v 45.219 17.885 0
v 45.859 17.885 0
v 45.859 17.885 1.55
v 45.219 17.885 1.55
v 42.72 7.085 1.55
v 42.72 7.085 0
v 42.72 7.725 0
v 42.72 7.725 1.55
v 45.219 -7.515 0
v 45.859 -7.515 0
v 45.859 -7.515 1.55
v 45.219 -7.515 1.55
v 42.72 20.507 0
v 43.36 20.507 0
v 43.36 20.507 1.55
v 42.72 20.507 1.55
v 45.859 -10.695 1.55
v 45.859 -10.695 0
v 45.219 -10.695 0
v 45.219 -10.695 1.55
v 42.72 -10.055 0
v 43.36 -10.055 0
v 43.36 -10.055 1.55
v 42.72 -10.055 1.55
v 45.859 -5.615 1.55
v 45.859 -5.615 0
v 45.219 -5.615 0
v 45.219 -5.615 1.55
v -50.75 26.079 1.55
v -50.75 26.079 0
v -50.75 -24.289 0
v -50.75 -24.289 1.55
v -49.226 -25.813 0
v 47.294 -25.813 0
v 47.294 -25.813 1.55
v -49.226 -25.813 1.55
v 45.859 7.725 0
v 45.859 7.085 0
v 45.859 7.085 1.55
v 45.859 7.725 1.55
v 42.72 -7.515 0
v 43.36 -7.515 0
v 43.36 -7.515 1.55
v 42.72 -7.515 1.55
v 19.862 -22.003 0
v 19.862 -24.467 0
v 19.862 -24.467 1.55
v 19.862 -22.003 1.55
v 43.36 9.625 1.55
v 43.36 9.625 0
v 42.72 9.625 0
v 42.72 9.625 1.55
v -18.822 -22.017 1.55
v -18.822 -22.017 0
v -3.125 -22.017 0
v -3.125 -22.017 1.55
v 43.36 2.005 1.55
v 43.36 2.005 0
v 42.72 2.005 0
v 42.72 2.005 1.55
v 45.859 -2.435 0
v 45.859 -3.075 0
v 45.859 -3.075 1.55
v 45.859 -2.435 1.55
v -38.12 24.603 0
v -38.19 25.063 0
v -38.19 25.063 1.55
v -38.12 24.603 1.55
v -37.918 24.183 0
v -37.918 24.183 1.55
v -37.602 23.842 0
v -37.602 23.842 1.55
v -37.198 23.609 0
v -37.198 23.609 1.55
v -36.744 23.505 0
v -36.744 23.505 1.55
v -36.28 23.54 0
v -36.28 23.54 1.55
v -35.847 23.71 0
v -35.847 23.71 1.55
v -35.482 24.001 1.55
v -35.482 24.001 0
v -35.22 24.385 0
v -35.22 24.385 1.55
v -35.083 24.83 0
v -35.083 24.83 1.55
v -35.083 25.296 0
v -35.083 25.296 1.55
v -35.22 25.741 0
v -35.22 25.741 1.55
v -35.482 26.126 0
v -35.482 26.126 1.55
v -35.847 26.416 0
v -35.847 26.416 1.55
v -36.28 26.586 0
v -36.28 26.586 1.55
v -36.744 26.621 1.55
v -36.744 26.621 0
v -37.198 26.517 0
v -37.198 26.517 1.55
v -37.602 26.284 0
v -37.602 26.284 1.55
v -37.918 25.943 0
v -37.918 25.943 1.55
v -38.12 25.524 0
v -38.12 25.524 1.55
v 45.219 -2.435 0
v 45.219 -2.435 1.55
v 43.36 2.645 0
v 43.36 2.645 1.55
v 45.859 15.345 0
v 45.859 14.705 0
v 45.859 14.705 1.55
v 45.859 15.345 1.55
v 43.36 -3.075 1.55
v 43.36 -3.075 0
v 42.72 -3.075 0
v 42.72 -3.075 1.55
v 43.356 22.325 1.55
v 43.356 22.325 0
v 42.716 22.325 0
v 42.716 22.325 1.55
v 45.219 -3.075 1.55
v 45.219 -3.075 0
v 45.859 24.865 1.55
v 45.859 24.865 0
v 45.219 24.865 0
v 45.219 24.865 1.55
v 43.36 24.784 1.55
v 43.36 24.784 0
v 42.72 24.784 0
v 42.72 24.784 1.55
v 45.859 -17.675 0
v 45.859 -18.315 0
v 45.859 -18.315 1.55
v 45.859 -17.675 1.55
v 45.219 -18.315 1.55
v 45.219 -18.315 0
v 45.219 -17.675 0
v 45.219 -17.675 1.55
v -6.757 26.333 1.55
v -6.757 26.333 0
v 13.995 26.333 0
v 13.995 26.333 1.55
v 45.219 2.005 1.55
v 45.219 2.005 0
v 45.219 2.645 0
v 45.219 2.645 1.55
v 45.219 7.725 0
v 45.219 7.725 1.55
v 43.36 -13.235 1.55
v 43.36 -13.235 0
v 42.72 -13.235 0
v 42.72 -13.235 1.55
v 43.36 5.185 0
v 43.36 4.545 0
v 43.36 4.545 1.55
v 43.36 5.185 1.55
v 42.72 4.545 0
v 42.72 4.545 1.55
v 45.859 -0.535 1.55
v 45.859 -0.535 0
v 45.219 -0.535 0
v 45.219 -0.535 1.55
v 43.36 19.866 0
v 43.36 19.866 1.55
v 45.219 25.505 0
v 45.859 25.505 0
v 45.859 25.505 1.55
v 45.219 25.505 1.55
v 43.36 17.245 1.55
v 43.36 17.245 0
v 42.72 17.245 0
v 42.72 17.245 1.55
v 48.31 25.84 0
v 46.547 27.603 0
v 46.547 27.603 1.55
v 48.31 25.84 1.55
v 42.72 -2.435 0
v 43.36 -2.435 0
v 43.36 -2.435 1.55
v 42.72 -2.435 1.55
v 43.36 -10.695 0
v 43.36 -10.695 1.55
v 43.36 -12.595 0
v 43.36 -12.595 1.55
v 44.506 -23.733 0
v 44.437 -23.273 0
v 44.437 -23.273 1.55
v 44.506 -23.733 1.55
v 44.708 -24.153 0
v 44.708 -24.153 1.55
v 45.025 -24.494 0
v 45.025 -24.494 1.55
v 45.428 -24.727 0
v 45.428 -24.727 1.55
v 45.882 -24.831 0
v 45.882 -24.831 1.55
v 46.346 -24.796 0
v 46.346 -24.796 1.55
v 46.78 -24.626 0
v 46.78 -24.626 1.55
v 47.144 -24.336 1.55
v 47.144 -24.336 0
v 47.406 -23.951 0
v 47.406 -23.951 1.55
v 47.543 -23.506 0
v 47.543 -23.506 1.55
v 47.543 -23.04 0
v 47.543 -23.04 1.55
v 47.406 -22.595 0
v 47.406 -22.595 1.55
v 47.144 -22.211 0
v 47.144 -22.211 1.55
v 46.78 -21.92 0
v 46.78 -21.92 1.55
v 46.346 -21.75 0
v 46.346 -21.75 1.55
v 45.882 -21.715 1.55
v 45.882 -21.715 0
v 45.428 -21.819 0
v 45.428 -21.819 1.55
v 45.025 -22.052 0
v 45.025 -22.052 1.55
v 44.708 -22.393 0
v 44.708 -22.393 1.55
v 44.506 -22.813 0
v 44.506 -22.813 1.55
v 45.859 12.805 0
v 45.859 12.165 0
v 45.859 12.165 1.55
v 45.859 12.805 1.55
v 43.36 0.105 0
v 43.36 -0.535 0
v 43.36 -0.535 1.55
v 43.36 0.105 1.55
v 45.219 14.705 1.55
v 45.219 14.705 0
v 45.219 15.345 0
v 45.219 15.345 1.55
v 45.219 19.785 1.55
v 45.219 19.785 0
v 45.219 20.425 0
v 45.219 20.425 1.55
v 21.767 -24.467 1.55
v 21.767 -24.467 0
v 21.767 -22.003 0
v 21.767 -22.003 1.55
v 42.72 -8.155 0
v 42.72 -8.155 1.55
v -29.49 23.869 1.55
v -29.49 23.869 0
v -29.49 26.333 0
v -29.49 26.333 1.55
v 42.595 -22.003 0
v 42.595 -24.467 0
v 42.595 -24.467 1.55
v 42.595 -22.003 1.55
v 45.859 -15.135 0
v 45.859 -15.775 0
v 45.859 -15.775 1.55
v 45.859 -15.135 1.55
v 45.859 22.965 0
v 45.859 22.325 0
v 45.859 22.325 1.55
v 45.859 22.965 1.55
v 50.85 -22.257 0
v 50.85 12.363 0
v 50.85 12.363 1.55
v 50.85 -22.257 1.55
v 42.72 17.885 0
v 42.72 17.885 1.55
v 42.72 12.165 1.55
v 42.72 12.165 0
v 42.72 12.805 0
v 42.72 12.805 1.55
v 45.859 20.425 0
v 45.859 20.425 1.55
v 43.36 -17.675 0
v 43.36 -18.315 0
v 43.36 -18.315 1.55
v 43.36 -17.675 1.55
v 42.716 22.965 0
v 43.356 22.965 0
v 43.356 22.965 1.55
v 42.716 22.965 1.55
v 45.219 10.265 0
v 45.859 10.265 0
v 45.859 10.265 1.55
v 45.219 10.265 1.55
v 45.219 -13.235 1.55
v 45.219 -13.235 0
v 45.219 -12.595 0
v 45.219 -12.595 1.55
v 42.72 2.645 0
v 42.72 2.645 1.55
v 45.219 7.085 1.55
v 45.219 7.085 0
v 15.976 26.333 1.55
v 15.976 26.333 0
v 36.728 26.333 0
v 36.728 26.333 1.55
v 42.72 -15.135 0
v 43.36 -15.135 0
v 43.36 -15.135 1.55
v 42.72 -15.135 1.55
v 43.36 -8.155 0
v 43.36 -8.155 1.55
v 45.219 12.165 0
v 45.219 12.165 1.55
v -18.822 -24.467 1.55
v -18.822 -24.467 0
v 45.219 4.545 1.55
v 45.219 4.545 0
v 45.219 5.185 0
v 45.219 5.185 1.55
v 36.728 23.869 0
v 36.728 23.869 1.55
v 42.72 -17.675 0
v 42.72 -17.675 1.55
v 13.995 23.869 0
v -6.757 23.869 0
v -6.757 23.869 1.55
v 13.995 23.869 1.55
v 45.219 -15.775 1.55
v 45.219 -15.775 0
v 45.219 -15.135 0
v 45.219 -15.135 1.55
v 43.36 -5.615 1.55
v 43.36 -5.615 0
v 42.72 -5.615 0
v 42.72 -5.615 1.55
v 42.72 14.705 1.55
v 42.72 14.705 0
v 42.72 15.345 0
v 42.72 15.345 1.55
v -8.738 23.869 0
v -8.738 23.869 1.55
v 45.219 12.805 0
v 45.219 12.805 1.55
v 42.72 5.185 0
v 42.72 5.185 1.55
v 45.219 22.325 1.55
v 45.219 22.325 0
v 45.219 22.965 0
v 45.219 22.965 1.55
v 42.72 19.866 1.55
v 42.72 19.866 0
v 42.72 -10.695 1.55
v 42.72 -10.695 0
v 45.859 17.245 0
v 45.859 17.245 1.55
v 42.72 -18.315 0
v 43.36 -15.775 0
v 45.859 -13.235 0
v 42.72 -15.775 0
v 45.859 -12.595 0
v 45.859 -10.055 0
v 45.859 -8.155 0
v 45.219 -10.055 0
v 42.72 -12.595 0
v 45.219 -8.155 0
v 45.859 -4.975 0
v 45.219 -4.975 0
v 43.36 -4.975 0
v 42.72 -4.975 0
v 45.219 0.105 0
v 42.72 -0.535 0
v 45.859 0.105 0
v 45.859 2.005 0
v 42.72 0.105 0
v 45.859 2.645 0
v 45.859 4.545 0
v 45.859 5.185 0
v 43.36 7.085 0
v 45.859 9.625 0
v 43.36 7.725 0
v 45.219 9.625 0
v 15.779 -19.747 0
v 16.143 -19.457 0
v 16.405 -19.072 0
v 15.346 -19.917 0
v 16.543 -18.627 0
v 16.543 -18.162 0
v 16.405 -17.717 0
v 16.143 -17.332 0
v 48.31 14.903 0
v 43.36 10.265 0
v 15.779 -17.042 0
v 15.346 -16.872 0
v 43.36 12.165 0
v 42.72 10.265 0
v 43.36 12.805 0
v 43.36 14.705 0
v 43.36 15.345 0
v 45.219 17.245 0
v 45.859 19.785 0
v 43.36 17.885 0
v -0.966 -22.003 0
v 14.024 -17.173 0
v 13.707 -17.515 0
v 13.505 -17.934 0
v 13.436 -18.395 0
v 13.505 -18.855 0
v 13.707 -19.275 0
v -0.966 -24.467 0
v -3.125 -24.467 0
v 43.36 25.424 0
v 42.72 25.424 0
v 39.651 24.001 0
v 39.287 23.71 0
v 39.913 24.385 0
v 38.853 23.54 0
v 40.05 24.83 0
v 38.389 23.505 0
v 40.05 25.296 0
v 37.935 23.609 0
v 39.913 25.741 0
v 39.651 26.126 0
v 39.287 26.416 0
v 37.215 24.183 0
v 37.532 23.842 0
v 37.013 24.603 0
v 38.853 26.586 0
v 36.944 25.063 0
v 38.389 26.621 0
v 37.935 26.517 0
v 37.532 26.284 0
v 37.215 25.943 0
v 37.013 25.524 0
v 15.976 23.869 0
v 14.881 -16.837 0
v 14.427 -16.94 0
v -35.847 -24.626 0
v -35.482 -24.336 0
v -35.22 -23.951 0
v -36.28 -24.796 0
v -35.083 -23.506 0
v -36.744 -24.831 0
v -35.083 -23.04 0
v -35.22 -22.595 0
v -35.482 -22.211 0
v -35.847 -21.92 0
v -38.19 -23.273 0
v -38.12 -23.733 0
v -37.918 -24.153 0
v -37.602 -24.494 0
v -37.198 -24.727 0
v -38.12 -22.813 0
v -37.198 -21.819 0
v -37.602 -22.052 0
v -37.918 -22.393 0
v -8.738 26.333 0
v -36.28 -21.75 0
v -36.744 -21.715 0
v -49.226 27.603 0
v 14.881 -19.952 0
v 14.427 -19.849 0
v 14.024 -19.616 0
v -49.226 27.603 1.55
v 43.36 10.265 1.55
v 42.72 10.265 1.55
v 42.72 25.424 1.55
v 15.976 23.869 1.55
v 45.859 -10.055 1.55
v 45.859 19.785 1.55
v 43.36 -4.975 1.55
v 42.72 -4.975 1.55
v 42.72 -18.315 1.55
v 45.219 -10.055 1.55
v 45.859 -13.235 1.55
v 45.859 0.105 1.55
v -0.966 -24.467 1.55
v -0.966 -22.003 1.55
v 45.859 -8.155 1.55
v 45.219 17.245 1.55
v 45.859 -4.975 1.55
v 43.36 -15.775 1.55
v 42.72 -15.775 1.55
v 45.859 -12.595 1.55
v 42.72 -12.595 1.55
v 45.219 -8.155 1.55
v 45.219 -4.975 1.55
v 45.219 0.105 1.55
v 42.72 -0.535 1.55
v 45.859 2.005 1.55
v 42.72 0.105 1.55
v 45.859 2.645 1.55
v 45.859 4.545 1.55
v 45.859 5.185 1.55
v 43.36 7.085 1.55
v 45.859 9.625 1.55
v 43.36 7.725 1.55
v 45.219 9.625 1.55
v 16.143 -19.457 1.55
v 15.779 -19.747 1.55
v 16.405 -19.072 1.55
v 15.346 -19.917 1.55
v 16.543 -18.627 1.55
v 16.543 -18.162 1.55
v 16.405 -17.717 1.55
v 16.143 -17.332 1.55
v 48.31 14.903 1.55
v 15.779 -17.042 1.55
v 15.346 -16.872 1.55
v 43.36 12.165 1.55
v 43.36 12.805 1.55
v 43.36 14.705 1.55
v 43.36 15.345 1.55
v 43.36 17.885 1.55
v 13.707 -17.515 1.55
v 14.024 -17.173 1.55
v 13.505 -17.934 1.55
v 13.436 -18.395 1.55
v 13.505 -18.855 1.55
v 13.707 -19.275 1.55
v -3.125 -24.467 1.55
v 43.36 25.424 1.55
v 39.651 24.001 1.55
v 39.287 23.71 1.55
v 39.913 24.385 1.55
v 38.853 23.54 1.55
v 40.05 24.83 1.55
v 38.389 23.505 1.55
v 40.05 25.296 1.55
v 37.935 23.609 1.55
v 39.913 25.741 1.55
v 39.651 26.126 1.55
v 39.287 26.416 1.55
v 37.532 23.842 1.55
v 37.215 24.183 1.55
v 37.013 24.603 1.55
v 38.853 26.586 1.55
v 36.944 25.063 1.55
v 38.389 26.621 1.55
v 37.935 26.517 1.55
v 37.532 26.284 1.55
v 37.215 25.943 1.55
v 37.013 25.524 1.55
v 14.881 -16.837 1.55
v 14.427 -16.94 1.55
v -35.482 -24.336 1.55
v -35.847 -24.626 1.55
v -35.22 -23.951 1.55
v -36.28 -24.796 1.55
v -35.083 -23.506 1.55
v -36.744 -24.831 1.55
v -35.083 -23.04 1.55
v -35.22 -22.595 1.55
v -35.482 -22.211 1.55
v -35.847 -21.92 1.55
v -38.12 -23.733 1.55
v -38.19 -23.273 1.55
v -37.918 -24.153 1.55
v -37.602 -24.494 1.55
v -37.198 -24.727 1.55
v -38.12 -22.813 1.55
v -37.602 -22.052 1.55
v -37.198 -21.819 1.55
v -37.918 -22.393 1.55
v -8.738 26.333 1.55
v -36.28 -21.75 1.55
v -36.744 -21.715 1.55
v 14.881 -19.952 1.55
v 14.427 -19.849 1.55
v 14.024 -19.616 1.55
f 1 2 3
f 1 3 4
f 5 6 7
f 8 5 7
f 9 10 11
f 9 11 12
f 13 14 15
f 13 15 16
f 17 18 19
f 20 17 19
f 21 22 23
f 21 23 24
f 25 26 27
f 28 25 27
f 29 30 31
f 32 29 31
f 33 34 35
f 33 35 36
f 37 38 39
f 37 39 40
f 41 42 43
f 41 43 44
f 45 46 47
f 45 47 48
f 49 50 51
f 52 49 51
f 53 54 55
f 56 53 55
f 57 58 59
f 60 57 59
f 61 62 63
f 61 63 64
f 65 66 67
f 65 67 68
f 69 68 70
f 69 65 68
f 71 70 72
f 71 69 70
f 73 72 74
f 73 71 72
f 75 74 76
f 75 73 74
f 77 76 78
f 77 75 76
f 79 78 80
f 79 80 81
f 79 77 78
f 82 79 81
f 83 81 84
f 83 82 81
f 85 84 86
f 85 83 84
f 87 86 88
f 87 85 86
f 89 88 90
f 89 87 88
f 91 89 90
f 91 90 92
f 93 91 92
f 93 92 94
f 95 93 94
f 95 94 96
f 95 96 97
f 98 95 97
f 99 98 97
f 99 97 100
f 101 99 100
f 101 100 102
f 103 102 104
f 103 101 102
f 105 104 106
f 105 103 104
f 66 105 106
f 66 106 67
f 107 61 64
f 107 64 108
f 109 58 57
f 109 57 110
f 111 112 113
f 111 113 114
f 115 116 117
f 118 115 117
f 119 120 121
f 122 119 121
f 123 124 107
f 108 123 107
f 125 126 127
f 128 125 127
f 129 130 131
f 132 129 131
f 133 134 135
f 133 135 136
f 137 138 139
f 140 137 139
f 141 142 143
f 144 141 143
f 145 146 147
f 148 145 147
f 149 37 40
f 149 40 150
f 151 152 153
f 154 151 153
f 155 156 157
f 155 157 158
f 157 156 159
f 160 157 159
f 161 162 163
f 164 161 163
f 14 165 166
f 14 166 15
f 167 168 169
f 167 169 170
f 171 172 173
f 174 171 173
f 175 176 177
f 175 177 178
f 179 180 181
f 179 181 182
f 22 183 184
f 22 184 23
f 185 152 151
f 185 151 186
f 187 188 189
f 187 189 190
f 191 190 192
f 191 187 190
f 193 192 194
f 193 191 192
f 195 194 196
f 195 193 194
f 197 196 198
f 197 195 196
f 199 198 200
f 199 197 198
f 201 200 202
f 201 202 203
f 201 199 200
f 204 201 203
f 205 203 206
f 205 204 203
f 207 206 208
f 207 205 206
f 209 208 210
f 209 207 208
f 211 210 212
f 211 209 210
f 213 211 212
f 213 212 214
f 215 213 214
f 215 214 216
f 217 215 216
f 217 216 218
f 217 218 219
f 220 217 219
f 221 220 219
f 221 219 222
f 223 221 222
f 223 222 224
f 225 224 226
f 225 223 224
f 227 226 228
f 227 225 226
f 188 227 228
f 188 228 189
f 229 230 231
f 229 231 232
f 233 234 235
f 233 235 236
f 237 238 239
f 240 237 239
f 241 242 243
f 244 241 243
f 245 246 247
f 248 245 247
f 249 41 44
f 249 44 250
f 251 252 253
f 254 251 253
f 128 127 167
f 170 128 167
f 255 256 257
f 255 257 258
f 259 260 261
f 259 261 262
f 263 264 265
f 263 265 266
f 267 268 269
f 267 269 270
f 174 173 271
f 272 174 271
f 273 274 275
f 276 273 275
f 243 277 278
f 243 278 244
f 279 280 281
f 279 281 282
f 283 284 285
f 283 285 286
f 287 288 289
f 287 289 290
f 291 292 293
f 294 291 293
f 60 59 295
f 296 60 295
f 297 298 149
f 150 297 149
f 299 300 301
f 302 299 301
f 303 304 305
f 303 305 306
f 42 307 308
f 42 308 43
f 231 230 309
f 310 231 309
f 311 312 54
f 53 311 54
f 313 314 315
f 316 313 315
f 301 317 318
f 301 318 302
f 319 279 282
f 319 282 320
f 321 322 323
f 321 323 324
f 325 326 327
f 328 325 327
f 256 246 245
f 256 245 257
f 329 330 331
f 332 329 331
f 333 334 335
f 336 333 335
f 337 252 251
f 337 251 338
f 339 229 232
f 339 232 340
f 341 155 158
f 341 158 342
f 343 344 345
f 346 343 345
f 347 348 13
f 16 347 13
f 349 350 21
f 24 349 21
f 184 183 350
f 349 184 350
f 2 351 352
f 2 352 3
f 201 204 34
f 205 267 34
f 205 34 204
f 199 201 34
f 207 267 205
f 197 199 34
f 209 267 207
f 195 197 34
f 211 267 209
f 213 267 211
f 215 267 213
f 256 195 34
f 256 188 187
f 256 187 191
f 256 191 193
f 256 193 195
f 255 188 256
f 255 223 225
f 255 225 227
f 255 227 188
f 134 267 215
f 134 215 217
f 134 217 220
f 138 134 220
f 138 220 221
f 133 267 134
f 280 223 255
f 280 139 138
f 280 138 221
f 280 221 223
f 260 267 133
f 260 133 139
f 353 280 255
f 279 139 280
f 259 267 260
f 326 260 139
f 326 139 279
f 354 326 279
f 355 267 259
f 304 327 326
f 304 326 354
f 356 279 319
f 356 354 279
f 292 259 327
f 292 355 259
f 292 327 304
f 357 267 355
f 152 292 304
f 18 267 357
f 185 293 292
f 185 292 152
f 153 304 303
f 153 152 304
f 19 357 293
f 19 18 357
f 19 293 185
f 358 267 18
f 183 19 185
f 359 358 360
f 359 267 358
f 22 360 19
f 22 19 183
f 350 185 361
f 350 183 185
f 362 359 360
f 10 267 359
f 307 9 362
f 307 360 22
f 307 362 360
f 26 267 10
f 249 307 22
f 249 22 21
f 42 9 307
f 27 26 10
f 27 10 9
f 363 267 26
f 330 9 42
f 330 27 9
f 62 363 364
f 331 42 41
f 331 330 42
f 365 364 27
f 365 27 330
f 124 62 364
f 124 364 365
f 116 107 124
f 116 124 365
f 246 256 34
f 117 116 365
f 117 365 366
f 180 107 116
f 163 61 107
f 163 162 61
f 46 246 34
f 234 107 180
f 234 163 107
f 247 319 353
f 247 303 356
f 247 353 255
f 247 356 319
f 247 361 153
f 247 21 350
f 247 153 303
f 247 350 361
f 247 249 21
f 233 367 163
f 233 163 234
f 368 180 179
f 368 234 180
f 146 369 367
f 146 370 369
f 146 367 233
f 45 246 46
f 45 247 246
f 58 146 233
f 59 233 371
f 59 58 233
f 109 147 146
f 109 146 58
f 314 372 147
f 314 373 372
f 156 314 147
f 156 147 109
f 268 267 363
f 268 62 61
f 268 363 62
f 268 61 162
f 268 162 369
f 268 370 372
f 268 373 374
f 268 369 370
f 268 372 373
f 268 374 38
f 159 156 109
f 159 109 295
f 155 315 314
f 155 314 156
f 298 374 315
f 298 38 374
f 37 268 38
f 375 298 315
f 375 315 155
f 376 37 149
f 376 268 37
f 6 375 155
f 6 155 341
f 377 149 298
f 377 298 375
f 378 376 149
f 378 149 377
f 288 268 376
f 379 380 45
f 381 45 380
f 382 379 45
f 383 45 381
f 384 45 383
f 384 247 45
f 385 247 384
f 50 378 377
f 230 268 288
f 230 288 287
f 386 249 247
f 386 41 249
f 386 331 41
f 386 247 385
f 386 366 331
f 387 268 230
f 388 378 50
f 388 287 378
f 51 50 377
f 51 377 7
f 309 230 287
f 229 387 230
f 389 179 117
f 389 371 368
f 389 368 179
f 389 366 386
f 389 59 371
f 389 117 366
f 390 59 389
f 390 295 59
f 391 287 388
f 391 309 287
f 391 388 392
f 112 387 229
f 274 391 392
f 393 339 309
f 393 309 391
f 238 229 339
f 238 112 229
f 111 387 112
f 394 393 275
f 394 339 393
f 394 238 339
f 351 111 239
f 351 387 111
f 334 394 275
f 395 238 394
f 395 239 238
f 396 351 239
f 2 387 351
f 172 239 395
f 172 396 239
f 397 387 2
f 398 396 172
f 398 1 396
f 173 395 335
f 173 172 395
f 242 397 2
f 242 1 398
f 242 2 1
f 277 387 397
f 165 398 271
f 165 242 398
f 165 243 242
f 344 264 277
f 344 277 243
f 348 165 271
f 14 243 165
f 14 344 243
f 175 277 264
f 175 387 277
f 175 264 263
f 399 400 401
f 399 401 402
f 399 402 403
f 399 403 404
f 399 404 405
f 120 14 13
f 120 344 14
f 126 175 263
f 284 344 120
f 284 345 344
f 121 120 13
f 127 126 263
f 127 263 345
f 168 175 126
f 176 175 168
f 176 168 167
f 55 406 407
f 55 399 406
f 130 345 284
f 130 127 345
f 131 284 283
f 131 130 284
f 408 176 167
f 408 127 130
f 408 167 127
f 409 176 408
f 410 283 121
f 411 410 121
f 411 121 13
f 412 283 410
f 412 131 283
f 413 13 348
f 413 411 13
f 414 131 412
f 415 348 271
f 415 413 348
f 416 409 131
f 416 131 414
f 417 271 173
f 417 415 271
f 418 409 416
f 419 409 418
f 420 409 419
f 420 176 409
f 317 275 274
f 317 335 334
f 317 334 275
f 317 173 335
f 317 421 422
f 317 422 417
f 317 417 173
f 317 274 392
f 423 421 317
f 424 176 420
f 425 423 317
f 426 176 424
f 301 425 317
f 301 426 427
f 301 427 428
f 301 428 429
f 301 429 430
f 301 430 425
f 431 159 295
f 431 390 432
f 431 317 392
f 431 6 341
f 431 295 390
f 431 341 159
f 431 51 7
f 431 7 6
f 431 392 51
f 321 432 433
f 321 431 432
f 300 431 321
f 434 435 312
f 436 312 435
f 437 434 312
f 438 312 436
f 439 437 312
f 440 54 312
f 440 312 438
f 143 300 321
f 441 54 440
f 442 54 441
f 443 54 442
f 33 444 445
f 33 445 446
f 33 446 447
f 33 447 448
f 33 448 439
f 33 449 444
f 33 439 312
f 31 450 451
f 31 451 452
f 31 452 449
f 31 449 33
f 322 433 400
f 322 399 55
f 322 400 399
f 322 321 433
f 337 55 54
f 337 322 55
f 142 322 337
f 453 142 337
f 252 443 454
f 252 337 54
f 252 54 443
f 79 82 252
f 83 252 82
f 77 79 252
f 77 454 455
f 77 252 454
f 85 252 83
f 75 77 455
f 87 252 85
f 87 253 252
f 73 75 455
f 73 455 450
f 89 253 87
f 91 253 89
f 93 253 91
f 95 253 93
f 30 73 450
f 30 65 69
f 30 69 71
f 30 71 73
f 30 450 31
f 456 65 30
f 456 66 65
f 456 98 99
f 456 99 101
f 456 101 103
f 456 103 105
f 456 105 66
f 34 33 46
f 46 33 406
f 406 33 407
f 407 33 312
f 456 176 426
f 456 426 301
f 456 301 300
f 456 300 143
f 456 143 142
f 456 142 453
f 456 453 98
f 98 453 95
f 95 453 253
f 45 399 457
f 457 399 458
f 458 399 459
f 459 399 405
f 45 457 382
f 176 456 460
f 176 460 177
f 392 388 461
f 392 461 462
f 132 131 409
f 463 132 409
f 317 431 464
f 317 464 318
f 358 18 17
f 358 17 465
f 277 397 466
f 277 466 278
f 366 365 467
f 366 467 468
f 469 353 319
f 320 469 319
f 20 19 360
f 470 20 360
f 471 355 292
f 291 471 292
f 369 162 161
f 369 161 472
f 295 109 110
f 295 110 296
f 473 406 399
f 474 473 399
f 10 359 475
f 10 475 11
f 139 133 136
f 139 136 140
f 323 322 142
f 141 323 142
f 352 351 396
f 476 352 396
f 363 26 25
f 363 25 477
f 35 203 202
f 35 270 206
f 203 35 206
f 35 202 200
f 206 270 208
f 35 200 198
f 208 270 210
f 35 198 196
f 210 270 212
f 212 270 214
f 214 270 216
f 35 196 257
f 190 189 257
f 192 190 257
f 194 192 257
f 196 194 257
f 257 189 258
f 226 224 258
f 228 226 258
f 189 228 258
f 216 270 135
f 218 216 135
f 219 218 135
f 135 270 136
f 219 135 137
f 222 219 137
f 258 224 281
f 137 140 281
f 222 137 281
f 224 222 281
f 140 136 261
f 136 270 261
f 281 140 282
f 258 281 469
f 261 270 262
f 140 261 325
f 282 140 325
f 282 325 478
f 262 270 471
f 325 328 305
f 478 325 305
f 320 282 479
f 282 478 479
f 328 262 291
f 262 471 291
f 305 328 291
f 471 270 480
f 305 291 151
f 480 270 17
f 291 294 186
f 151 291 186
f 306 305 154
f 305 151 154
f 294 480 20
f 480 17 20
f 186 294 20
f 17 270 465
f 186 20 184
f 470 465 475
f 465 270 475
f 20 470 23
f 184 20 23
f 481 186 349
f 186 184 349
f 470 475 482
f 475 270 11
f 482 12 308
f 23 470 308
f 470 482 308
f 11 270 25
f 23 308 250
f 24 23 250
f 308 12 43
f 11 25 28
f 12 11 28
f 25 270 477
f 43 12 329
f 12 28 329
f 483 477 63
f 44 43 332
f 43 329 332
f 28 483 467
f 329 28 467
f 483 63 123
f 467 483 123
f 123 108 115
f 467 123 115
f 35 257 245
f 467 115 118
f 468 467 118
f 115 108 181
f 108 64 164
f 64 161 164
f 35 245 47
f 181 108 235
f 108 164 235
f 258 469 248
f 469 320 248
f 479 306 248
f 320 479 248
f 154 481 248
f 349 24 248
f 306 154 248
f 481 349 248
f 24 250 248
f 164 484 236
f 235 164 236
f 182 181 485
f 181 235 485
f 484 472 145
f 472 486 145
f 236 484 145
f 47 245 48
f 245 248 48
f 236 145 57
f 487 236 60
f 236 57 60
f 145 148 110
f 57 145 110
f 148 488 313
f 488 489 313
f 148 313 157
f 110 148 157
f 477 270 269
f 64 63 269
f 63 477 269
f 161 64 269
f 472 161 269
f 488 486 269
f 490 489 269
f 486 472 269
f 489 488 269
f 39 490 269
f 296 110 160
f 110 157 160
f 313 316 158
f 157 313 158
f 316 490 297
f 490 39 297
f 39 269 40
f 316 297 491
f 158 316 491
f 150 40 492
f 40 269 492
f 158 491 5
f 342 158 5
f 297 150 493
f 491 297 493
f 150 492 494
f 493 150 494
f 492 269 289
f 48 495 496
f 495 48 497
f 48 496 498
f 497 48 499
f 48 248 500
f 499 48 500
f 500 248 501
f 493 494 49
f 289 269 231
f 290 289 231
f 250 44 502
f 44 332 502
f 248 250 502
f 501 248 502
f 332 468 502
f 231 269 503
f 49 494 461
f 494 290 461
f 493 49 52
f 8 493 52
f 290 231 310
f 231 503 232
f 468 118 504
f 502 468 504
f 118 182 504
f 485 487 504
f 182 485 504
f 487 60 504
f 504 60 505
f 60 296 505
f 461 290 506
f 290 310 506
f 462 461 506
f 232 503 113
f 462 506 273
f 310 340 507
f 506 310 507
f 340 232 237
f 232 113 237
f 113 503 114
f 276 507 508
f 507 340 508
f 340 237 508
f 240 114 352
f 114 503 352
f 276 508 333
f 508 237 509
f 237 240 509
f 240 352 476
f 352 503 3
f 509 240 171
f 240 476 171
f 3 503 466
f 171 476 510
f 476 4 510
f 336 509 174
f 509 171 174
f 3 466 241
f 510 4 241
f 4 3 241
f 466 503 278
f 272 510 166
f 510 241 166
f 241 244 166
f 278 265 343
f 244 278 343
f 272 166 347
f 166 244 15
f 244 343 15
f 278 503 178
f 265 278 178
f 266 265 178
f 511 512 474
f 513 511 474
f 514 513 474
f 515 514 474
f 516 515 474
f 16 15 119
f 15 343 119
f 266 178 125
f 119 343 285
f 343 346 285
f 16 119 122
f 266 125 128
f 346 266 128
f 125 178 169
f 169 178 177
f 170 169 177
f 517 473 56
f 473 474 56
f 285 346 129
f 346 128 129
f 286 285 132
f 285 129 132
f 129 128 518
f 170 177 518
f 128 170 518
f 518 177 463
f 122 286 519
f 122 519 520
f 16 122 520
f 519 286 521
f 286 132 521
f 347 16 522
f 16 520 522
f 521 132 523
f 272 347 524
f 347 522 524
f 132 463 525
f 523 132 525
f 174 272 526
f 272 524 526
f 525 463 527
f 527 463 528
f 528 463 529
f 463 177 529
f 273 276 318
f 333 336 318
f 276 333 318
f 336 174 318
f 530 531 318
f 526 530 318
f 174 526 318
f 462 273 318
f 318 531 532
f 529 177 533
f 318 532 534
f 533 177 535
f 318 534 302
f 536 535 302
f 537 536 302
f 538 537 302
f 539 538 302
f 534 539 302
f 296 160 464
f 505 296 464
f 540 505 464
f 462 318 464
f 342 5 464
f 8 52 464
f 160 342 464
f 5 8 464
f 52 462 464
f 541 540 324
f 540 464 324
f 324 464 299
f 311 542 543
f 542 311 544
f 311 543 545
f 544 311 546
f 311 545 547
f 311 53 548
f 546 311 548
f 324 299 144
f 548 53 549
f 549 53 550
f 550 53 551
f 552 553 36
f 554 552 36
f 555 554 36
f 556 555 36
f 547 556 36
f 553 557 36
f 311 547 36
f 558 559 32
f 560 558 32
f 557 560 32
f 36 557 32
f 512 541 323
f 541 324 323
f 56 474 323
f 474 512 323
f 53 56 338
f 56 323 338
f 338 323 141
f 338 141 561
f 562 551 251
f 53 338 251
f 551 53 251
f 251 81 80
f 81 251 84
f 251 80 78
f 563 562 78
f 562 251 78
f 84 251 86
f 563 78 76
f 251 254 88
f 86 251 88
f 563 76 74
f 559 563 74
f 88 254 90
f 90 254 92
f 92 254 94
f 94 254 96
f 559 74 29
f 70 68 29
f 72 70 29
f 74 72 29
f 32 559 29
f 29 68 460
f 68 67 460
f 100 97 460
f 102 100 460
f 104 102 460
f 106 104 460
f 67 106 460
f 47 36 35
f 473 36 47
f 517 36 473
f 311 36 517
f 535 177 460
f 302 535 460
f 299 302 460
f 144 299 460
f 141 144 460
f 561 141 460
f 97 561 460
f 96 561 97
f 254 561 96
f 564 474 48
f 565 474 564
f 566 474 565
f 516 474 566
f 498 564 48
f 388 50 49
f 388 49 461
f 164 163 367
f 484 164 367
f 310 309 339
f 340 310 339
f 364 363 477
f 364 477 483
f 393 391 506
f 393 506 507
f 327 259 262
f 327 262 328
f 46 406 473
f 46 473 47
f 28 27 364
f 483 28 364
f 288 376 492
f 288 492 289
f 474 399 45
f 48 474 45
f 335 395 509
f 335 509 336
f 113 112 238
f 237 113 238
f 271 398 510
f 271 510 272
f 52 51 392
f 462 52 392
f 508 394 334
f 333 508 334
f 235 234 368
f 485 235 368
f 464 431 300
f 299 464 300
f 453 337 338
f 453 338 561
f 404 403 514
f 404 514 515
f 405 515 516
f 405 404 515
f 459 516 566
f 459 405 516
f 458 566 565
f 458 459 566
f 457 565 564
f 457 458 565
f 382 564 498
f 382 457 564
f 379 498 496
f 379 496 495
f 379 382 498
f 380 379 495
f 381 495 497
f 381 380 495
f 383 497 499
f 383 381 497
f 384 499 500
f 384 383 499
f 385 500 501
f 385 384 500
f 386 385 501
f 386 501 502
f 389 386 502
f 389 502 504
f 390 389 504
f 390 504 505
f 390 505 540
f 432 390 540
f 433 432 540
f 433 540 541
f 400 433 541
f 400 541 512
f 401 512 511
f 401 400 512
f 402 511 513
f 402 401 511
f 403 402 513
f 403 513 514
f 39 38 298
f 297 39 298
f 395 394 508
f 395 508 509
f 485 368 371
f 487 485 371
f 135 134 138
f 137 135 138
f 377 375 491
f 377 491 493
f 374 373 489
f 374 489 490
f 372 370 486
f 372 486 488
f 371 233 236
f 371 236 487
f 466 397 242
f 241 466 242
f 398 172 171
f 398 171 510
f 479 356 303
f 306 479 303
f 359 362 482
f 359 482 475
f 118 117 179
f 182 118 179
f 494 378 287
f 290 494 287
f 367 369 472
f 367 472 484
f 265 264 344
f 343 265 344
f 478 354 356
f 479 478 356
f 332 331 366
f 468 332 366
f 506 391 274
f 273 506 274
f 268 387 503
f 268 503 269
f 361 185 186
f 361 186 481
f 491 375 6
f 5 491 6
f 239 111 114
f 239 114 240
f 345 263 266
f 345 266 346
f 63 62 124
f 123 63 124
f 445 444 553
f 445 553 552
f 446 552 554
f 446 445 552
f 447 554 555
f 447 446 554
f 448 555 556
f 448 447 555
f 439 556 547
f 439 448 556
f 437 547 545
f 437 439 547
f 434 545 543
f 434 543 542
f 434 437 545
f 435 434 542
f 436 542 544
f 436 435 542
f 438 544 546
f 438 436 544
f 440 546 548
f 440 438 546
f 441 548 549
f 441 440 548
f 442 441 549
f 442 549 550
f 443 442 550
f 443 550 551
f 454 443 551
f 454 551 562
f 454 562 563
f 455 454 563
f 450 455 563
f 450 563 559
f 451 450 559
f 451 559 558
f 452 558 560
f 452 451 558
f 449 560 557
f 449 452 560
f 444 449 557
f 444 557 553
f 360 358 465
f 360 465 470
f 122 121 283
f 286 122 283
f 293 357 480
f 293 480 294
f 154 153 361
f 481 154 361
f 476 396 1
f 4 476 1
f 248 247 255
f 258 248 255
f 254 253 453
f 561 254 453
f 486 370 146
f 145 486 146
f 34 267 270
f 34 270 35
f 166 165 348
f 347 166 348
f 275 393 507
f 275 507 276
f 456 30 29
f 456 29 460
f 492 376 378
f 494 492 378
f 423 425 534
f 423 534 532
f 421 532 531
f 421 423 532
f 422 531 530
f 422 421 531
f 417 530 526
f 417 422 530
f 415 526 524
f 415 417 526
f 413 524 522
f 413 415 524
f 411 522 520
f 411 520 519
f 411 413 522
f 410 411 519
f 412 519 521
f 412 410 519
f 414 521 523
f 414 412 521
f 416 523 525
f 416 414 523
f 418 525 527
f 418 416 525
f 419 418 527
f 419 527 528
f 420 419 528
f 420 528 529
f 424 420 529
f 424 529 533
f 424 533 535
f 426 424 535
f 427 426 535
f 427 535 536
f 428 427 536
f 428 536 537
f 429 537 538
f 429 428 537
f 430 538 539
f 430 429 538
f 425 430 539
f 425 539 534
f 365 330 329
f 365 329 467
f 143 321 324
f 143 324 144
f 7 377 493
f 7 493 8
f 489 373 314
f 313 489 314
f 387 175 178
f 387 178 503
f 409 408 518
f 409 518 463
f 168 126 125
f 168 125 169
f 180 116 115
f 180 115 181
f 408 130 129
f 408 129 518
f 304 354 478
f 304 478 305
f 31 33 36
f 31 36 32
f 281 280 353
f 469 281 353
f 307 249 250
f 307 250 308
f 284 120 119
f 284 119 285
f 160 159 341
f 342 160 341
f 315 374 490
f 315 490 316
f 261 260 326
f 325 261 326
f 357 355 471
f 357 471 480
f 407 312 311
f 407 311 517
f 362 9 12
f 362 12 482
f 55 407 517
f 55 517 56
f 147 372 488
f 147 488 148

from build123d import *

# Parameters (mm, degrees)
CROQUIS1_R              = 1.5621
CROQUIS1_W              = 20.7518
CROQUIS1_H              = 2.4638
CROQUIS1_W_2            = 4.9784
CROQUIS1_H_2            = 46.2788
CROQUIS1_W_3            = 20.828
CROQUIS1_W_4            = 15.6972
CROQUIS1_H_3            = 2.449418676
SALIENTE_EXTRUIR1_DEPTH = 1.55
CROQUIS2_W              = 5
CROQUIS2_H              = 46.2788
CORTAR_EXTRUIR1_DEPTH   = 95.55
CROQUIS3_W              = 0.64
CROQUIS3_H              = 0.64
SALIENTE_EXTRUIR2_DEPTH = 1.55
CROQUIS3_3_W            = 0.64
CROQUIS3_3_H            = 0.64
CROQUIS3_3_H_2          = 0.640713362
SALIENTE_EXTRUIR3_DEPTH = 1.55


with BuildPart() as part:
    # Croquis1 → Saliente-Extruir1 (new body)
    with BuildSketch(Plane.XY):
        Polygon((46.546610497, 27.60316171), (48.310045797, 25.83972641), (48.310045797, 14.90316171), (50.850045797, 12.36316171), (50.850045797, -22.25703829), (47.294045797, -25.81303829), (-49.225954203, -25.81303829), (-50.749954203, -24.28903829), (-50.749954203, -22.00303829), (-50.749954203, -12.85903829), (-50.749954203, 6.39416171), (-50.749954203, 18.33216171), (-50.749954203, 26.07916171), (-49.225954203, 27.60316171), align=None)
        with Locations(Location((-36.627554203, -23.27303829, 0), (0, 0, 180))):
            Circle(CROQUIS1_R, mode=Mode.SUBTRACT)
        with Locations(Location((14.997945797, -18.394545523, 0), (0, 0, 180))):
            Circle(CROQUIS1_R, mode=Mode.SUBTRACT)
        with Locations(Location((45.998645797, -23.27303829, 0), (0, 0, 180))):
            Circle(CROQUIS1_R, mode=Mode.SUBTRACT)
        with Locations(Location((-36.627554203, 25.06316171, 0), (0, 0, 180))):
            Circle(CROQUIS1_R, mode=Mode.SUBTRACT)
        with Locations(Location((38.505645797, 25.06316171, 0), (0, 0, 180))):
            Circle(CROQUIS1_R, mode=Mode.SUBTRACT)
        with Locations((-19.114254203, 25.10126171)):
            Rectangle(CROQUIS1_W, CROQUIS1_H, mode=Mode.SUBTRACT)
        with Locations((3.618745797, 25.10126171)):
            Rectangle(CROQUIS1_W, CROQUIS1_H, mode=Mode.SUBTRACT)
        with Locations((26.351745797, 25.10126171)):
            Rectangle(CROQUIS1_W, CROQUIS1_H, mode=Mode.SUBTRACT)
        with Locations((44.296845797, 3.24456171)):
            Rectangle(CROQUIS1_W_2, CROQUIS1_H_2, mode=Mode.SUBTRACT)
        with Locations((32.181045797, -23.23493829)):
            Rectangle(CROQUIS1_W_3, CROQUIS1_H, mode=Mode.SUBTRACT)
        with Locations((9.448045797, -23.23493829)):
            Rectangle(CROQUIS1_W_3, CROQUIS1_H, mode=Mode.SUBTRACT)
        with Locations((-10.973554203, -23.242128952)):
            Rectangle(CROQUIS1_W_4, CROQUIS1_H_3, mode=Mode.SUBTRACT)
    extrude(amount=SALIENTE_EXTRUIR1_DEPTH)

    # Croquis2 → Cortar-Extruir1 (cut)
    with BuildSketch(Plane(origin=(0, 0, 0), x_dir=(-1, 0, 0), z_dir=(0, 0, -1))):
        with Locations((-44.286045797, 3.24456171)):
            Rectangle(CROQUIS2_W, CROQUIS2_H)
    extrude(amount=-CORTAR_EXTRUIR1_DEPTH, mode=Mode.SUBTRACT)

    # Croquis3 → Saliente-Extruir2 (add)
    with BuildSketch(Plane(origin=(0, 0, 0), x_dir=(-1, 0, 0), z_dir=(0, 0, -1))):
        Polygon((-45.85862689, -7.83483829), (-46.786045797, -7.83483829), (-46.786045797, -19.89483829), (-41.786045797, -19.89483829), (-41.786045797, -7.83483829), (-42.720004997, -7.83483829), (-42.720004997, -8.15483829), (-43.360004997, -8.15483829), (-43.360004997, -7.83483829), (-45.218685961, -7.83483829), (-45.218685961, -8.15483829), (-45.85862689, -8.15483829), align=None)
        with Locations((-45.538685961, -17.99483829)):
            Rectangle(CROQUIS3_W, CROQUIS3_H, mode=Mode.SUBTRACT)
        with Locations((-43.040004997, -17.99483829)):
            Rectangle(CROQUIS3_W, CROQUIS3_H, mode=Mode.SUBTRACT)
        with Locations((-45.538685961, -15.45483829)):
            Rectangle(CROQUIS3_W, CROQUIS3_H, mode=Mode.SUBTRACT)
        with Locations((-45.538685961, -12.91483829)):
            Rectangle(CROQUIS3_W, CROQUIS3_H, mode=Mode.SUBTRACT)
        with Locations((-43.040004997, -15.45483829)):
            Rectangle(CROQUIS3_W, CROQUIS3_H, mode=Mode.SUBTRACT)
        with Locations((-43.040004997, -12.91483829)):
            Rectangle(CROQUIS3_W, CROQUIS3_H, mode=Mode.SUBTRACT)
        with Locations((-45.538685961, -10.37483829)):
            Rectangle(CROQUIS3_W, CROQUIS3_H, mode=Mode.SUBTRACT)
        with Locations((-43.040004997, -10.37483829)):
            Rectangle(CROQUIS3_W, CROQUIS3_H, mode=Mode.SUBTRACT)
    extrude(amount=-SALIENTE_EXTRUIR2_DEPTH)

    # Croquis3<3> → Saliente-Extruir3 (add)
    with BuildSketch(Plane(origin=(0, 0, 0), x_dir=(-1, 0, 0), z_dir=(0, 0, -1))):
        Polygon((-46.786045797, 26.38396171), (-46.786045797, -7.83483829), (-45.85862689, -7.83483829), (-45.85862689, -7.51483829), (-45.218685961, -7.51483829), (-45.218685961, -7.83483829), (-43.360004997, -7.83483829), (-43.360004997, -7.51483829), (-42.720004997, -7.51483829), (-42.720004997, -7.83483829), (-41.786045797, -7.83483829), (-41.786045797, 26.38396171), align=None)
        with Locations((-45.538685961, -5.29483829)):
            Rectangle(CROQUIS3_3_W, CROQUIS3_3_H, mode=Mode.SUBTRACT)
        with Locations((-45.538685961, -2.75483829)):
            Rectangle(CROQUIS3_3_W, CROQUIS3_3_H, mode=Mode.SUBTRACT)
        with Locations((-43.040004997, -5.29483829)):
            Rectangle(CROQUIS3_3_W, CROQUIS3_3_H, mode=Mode.SUBTRACT)
        with Locations((-43.040004997, -2.75483829)):
            Rectangle(CROQUIS3_3_W, CROQUIS3_3_H, mode=Mode.SUBTRACT)
        with Locations((-45.538685961, -0.21483829)):
            Rectangle(CROQUIS3_3_W, CROQUIS3_3_H, mode=Mode.SUBTRACT)
        with Locations((-43.040004997, -0.21483829)):
            Rectangle(CROQUIS3_3_W, CROQUIS3_3_H, mode=Mode.SUBTRACT)
        with Locations((-45.538685961, 2.32516171)):
            Rectangle(CROQUIS3_3_W, CROQUIS3_3_H, mode=Mode.SUBTRACT)
        with Locations((-43.040004997, 2.32516171)):
            Rectangle(CROQUIS3_3_W, CROQUIS3_3_H, mode=Mode.SUBTRACT)
        with Locations((-45.538685961, 4.86516171)):
            Rectangle(CROQUIS3_3_W, CROQUIS3_3_H, mode=Mode.SUBTRACT)
        with Locations((-45.538685961, 7.40516171)):
            Rectangle(CROQUIS3_3_W, CROQUIS3_3_H, mode=Mode.SUBTRACT)
        with Locations((-43.040004997, 4.86516171)):
            Rectangle(CROQUIS3_3_W, CROQUIS3_3_H, mode=Mode.SUBTRACT)
        with Locations((-43.040004997, 7.40516171)):
            Rectangle(CROQUIS3_3_W, CROQUIS3_3_H, mode=Mode.SUBTRACT)
        with Locations((-45.538685961, 9.94516171)):
            Rectangle(CROQUIS3_3_W, CROQUIS3_3_H, mode=Mode.SUBTRACT)
        with Locations((-43.040004997, 9.94516171)):
            Rectangle(CROQUIS3_3_W, CROQUIS3_3_H, mode=Mode.SUBTRACT)
        with Locations((-45.538685961, 12.48516171)):
            Rectangle(CROQUIS3_3_W, CROQUIS3_3_H, mode=Mode.SUBTRACT)
        with Locations((-43.040004997, 12.48516171)):
            Rectangle(CROQUIS3_3_W, CROQUIS3_3_H, mode=Mode.SUBTRACT)
        with Locations((-45.538685961, 15.02516171)):
            Rectangle(CROQUIS3_3_W, CROQUIS3_3_H, mode=Mode.SUBTRACT)
        with Locations((-45.538685961, 17.56516171)):
            Rectangle(CROQUIS3_3_W, CROQUIS3_3_H, mode=Mode.SUBTRACT)
        with Locations((-43.040004997, 15.02516171)):
            Rectangle(CROQUIS3_3_W, CROQUIS3_3_H, mode=Mode.SUBTRACT)
        with Locations((-43.040004997, 17.56516171)):
            Rectangle(CROQUIS3_3_W, CROQUIS3_3_H, mode=Mode.SUBTRACT)
        with Locations((-45.538685961, 20.10516171)):
            Rectangle(CROQUIS3_3_W, CROQUIS3_3_H, mode=Mode.SUBTRACT)
        with Locations((-43.040004997, 20.18636171)):
            Rectangle(CROQUIS3_3_W, CROQUIS3_3_H_2, mode=Mode.SUBTRACT)
        with Locations((-45.538685961, 22.64516171)):
            Rectangle(CROQUIS3_3_W, CROQUIS3_3_H, mode=Mode.SUBTRACT)
        with Locations((-43.036045797, 22.64516171)):
            Rectangle(CROQUIS3_3_W, CROQUIS3_3_H, mode=Mode.SUBTRACT)
        with Locations((-45.538685961, 25.18516171)):
            Rectangle(CROQUIS3_3_W, CROQUIS3_3_H, mode=Mode.SUBTRACT)
        with Locations((-43.040004997, 25.10396171)):
            Rectangle(CROQUIS3_3_W, CROQUIS3_3_H_2, mode=Mode.SUBTRACT)
    extrude(amount=-SALIENTE_EXTRUIR3_DEPTH)


solid = part.part
